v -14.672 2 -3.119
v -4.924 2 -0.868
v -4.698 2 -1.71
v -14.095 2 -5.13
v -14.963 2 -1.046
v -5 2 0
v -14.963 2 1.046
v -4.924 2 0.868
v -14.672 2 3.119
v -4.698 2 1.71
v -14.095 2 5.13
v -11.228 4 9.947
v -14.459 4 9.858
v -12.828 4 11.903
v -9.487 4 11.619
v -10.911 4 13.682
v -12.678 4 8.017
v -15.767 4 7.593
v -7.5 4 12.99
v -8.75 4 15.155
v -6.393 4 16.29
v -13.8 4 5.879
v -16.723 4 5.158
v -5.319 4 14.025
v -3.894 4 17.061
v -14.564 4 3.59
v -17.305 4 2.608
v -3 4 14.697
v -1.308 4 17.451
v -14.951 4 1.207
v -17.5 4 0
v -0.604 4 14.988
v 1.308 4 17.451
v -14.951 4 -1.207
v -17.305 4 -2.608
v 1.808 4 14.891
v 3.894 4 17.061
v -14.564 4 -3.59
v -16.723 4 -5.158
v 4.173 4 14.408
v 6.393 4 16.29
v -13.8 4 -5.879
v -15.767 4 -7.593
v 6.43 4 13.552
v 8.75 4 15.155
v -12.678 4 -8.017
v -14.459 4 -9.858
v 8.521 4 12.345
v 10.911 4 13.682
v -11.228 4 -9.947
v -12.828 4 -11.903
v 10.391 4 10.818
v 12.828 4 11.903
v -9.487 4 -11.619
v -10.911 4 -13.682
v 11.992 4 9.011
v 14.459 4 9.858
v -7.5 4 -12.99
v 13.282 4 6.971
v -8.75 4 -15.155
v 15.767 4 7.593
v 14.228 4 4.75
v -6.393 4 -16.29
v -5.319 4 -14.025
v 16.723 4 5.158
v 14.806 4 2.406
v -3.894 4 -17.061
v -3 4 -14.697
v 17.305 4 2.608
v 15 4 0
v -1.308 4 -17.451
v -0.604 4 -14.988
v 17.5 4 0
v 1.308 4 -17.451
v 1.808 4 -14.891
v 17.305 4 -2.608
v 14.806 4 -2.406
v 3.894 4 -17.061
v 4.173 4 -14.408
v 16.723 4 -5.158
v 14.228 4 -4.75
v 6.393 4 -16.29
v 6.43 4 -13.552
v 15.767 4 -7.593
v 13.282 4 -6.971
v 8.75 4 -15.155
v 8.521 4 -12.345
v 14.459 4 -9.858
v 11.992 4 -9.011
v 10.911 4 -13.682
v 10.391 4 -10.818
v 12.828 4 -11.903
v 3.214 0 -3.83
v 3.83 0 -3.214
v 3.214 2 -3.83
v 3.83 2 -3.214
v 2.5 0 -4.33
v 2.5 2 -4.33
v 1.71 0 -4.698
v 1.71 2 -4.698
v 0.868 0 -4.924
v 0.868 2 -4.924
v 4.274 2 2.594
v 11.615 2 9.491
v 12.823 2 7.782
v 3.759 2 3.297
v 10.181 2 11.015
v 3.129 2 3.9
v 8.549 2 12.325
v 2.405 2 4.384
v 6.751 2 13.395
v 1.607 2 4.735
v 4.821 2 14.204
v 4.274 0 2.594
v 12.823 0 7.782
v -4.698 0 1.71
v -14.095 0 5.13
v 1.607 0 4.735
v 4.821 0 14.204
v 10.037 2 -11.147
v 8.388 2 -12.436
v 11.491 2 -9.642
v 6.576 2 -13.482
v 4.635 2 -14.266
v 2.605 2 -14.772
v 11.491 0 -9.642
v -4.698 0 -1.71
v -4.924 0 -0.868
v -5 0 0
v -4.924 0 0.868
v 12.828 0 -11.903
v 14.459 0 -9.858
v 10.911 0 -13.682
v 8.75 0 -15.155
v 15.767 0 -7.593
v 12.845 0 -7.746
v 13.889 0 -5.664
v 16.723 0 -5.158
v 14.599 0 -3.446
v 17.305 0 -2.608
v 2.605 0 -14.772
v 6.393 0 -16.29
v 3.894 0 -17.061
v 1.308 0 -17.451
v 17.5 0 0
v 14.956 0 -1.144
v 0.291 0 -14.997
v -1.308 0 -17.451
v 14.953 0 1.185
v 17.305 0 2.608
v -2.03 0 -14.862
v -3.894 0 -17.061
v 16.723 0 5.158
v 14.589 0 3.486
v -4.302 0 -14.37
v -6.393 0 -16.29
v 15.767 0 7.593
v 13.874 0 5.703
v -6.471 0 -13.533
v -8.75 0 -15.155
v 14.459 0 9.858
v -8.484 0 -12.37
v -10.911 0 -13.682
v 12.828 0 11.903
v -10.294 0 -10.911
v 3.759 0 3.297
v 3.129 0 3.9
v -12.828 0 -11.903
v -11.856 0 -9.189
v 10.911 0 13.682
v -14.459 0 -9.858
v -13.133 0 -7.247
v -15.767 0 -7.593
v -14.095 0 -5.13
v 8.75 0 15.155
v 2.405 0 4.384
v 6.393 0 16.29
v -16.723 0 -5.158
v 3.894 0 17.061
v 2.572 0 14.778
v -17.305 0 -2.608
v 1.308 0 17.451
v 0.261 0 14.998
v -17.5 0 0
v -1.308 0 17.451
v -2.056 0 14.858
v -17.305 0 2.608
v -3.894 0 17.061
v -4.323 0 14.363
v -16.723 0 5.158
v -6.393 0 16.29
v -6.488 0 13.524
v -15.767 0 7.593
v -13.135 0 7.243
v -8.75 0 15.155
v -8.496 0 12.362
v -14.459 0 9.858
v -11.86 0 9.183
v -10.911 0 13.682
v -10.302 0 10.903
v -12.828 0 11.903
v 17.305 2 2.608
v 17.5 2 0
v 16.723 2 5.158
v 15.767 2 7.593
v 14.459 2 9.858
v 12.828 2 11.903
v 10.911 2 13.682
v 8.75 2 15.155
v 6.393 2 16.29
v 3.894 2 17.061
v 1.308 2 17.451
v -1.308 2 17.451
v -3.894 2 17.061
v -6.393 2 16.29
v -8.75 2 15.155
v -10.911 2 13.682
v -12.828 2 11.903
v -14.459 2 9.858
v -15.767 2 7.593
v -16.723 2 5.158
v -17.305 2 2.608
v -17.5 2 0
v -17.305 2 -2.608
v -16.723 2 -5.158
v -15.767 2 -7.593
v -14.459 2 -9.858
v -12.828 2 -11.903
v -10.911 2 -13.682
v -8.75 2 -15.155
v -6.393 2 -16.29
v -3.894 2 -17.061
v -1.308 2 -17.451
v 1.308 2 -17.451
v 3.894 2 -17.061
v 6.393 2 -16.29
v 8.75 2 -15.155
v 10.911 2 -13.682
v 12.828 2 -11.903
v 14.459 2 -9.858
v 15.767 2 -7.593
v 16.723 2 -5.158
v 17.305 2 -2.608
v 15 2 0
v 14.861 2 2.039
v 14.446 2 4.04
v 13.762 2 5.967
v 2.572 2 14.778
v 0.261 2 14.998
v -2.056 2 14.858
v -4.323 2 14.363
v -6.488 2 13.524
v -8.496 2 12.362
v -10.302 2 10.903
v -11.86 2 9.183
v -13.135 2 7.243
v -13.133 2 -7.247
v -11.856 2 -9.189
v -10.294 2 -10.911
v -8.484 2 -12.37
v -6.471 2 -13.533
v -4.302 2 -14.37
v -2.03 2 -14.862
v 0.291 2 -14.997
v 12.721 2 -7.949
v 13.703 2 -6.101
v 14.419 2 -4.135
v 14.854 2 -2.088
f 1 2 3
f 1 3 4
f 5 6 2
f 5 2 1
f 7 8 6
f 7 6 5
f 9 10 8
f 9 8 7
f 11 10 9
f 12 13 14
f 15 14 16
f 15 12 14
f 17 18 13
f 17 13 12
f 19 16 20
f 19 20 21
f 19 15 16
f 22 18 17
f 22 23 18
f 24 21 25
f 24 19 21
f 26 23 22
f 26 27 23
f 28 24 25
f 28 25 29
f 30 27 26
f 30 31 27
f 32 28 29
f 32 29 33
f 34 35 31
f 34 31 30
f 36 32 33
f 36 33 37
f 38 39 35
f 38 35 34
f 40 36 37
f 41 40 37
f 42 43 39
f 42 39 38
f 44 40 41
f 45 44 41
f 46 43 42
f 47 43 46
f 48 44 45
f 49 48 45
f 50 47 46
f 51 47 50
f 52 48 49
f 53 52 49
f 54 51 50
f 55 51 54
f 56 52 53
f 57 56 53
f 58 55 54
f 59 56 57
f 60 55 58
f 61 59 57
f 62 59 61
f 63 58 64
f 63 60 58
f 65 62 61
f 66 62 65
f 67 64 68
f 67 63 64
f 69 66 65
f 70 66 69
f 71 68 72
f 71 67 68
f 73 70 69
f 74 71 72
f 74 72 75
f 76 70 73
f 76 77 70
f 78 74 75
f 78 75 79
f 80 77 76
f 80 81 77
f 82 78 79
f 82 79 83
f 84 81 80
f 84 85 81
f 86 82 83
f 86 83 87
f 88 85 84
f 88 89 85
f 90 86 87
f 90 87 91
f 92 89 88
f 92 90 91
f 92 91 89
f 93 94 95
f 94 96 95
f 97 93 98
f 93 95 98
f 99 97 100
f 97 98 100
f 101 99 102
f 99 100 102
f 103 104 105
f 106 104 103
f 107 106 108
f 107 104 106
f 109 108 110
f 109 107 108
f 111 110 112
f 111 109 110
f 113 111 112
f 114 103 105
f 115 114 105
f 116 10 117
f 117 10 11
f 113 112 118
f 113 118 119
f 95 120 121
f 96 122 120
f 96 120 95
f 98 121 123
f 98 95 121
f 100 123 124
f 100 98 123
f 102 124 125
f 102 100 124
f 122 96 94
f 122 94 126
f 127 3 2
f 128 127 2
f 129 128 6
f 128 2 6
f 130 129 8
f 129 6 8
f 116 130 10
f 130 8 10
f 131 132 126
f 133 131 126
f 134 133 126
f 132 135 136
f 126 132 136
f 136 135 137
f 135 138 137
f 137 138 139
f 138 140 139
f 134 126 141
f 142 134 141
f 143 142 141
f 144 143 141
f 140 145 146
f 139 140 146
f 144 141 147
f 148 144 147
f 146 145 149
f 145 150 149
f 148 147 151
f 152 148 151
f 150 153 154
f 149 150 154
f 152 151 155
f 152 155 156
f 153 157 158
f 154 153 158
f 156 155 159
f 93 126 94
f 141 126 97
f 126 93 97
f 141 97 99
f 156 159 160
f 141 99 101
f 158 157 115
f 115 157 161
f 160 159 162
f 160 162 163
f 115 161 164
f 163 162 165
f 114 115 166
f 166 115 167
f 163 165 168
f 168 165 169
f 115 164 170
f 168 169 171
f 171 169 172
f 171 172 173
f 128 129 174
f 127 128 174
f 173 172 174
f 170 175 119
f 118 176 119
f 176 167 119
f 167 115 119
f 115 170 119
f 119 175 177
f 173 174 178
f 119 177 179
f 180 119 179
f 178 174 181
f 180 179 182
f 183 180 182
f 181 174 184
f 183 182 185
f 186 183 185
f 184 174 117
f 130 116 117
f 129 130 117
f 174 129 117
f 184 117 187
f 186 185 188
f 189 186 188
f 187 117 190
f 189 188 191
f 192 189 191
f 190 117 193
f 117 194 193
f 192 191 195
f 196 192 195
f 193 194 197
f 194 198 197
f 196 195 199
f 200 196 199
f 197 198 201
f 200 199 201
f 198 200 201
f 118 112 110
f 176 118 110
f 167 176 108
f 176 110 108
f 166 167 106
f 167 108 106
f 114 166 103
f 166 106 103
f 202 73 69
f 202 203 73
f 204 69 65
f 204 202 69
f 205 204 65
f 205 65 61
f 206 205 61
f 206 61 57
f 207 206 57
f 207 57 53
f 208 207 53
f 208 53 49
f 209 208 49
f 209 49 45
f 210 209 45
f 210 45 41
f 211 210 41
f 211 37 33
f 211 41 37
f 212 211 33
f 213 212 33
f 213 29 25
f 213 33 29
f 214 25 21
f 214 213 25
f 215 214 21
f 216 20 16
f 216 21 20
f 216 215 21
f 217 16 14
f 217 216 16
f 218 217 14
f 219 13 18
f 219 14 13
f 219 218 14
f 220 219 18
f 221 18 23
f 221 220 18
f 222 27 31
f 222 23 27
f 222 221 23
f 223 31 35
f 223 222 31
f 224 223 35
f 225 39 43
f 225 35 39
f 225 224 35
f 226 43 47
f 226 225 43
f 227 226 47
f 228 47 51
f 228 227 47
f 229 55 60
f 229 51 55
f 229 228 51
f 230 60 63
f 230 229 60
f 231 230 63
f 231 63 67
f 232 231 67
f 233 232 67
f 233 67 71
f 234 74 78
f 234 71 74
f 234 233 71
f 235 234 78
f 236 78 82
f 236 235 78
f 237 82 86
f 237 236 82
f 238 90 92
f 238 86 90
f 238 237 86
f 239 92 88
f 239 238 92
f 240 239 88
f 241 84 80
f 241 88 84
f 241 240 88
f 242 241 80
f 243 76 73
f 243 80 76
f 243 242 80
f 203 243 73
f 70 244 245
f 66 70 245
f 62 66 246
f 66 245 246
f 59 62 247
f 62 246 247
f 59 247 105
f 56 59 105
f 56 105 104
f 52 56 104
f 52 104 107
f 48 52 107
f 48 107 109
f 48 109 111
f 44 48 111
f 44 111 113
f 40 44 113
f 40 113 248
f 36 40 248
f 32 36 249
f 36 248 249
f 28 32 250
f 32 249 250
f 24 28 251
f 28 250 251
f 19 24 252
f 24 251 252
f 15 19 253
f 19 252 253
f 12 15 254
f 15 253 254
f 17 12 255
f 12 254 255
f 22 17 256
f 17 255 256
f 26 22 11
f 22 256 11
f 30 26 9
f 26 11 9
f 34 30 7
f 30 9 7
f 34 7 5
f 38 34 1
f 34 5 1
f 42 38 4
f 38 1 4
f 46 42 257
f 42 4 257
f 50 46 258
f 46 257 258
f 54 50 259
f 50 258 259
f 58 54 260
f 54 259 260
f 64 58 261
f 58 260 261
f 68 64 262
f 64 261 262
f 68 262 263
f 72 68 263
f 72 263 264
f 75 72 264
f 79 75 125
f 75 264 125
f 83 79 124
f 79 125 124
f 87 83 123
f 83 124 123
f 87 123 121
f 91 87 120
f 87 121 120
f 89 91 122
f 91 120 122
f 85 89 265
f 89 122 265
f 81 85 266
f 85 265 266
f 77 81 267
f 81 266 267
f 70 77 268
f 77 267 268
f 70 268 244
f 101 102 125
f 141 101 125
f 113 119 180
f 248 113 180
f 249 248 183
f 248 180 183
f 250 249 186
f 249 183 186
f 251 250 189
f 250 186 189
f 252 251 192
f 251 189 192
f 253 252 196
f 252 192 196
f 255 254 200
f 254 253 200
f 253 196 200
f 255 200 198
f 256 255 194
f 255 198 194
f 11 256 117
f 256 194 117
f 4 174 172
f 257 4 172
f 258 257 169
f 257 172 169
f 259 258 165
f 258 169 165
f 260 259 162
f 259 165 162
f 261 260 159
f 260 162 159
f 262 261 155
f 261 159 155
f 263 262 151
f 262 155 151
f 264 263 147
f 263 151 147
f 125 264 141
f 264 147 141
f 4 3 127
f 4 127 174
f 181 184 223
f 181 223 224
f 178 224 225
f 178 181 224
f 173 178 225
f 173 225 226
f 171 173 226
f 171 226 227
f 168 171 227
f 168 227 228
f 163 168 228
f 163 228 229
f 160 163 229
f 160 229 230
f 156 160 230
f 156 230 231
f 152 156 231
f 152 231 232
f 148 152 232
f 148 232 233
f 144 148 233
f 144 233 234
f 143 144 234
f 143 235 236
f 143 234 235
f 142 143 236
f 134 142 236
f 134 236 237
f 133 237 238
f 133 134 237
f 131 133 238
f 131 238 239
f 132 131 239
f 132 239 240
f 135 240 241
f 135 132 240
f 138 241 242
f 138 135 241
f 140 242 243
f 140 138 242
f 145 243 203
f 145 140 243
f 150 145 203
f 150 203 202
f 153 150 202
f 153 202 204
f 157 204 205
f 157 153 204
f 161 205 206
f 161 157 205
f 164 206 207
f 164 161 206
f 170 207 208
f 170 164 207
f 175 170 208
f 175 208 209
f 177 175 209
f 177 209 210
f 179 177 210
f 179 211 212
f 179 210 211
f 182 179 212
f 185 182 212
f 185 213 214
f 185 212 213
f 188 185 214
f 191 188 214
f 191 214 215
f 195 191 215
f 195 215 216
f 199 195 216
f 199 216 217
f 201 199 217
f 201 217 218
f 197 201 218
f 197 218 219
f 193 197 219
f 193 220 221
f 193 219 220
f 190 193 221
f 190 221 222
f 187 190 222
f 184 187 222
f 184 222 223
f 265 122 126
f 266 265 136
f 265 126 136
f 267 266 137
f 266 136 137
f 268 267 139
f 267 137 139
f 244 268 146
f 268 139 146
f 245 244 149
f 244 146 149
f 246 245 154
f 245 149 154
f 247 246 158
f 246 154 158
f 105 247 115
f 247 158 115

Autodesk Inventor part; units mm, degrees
ref_plane "YZ Plane" through (0, 0, 0) normal (1, 0, 0) x (0, 1, 0)
ref_plane "XZ Plane" through (0, 0, 0) normal (0, 1, 0) x (-1, 0, 0)
ref_plane "XY Plane" through (0, 0, 0) normal (0, 0, 1) x (1, 0, 0)
sketch "스케치1" plane through (0, 0, 0) normal (0, 1, 0) x (-1, 0, 0)
  circle A0 centre (0, 0) radius 15
  circle A1 centre (0, 0) radius 17.5
  dimension "d0" = 30
  dimension "d1" = 35
extrude "돌출1" add sketch "스케치1" along normal blind 2
sketch "스케치2" plane through (0, 2, 0) normal (0, 1, 0) x (1, 0, 0)
  line L0 (0, 0) -> (-15, 0)
  circle A0 centre (0, 0) radius 15 projected
  line L1 (0, 0) -> (-14.0954, -5.1303)
  line L2 (0, 0) -> (15, 0) construction
  line L3 (0, 0) -> (-14.0954, 5.1303)
  line L4 (0, 0) -> (11.4907, 9.6418)
  line L5 (0, 0) -> (2.6047, 14.7721)
  line L6 (0, 0) -> (12.8233, -7.7822)
  line L7 (0, 0) -> (4.8209, -14.2042)
  arc A1 (-14.0954, 5.1303) -> (-14.0954, -5.1303) centre (0, 0) ccw
  arc A2 (4.8209, -14.2042) -> (12.8233, -7.7822) centre (0, 0) ccw
  arc A3 (11.4907, 9.6418) -> (2.6047, 14.7721) centre (0, 0) ccw
  circle A4 centre (0, 0) radius 5
  point P0 (-7.5, 0)
  point P1 (0.8682, 4.924)
  point P2 (3.8302, 3.2139)
  point P3 (4.2744, -2.5941)
  point P4 (1.607, -4.7347)
  point P5 (-4.6985, 1.7101)
  point P6 (-4.6985, -1.7101)
  dimension "d15" = 10
extrude "돌출2" add sketch "스케치2" against normal blind 2 contours A4 L1 A0 L0 | L0 A0 L3 A4 | A4 L5 A0 L4 | L6 A0 L7 A4
sketch "스케치3" plane through (0, 2, 0) normal (0, 1, 0) x (1, 0, 0)
  circle A0 centre (0, 0) radius 15
  circle A1 centre (0, 0) radius 17.5
  dimension "d18" = 30
extrude "돌출3" add sketch "스케치3" along normal blind 2
properties part number "fan_num5_1"
